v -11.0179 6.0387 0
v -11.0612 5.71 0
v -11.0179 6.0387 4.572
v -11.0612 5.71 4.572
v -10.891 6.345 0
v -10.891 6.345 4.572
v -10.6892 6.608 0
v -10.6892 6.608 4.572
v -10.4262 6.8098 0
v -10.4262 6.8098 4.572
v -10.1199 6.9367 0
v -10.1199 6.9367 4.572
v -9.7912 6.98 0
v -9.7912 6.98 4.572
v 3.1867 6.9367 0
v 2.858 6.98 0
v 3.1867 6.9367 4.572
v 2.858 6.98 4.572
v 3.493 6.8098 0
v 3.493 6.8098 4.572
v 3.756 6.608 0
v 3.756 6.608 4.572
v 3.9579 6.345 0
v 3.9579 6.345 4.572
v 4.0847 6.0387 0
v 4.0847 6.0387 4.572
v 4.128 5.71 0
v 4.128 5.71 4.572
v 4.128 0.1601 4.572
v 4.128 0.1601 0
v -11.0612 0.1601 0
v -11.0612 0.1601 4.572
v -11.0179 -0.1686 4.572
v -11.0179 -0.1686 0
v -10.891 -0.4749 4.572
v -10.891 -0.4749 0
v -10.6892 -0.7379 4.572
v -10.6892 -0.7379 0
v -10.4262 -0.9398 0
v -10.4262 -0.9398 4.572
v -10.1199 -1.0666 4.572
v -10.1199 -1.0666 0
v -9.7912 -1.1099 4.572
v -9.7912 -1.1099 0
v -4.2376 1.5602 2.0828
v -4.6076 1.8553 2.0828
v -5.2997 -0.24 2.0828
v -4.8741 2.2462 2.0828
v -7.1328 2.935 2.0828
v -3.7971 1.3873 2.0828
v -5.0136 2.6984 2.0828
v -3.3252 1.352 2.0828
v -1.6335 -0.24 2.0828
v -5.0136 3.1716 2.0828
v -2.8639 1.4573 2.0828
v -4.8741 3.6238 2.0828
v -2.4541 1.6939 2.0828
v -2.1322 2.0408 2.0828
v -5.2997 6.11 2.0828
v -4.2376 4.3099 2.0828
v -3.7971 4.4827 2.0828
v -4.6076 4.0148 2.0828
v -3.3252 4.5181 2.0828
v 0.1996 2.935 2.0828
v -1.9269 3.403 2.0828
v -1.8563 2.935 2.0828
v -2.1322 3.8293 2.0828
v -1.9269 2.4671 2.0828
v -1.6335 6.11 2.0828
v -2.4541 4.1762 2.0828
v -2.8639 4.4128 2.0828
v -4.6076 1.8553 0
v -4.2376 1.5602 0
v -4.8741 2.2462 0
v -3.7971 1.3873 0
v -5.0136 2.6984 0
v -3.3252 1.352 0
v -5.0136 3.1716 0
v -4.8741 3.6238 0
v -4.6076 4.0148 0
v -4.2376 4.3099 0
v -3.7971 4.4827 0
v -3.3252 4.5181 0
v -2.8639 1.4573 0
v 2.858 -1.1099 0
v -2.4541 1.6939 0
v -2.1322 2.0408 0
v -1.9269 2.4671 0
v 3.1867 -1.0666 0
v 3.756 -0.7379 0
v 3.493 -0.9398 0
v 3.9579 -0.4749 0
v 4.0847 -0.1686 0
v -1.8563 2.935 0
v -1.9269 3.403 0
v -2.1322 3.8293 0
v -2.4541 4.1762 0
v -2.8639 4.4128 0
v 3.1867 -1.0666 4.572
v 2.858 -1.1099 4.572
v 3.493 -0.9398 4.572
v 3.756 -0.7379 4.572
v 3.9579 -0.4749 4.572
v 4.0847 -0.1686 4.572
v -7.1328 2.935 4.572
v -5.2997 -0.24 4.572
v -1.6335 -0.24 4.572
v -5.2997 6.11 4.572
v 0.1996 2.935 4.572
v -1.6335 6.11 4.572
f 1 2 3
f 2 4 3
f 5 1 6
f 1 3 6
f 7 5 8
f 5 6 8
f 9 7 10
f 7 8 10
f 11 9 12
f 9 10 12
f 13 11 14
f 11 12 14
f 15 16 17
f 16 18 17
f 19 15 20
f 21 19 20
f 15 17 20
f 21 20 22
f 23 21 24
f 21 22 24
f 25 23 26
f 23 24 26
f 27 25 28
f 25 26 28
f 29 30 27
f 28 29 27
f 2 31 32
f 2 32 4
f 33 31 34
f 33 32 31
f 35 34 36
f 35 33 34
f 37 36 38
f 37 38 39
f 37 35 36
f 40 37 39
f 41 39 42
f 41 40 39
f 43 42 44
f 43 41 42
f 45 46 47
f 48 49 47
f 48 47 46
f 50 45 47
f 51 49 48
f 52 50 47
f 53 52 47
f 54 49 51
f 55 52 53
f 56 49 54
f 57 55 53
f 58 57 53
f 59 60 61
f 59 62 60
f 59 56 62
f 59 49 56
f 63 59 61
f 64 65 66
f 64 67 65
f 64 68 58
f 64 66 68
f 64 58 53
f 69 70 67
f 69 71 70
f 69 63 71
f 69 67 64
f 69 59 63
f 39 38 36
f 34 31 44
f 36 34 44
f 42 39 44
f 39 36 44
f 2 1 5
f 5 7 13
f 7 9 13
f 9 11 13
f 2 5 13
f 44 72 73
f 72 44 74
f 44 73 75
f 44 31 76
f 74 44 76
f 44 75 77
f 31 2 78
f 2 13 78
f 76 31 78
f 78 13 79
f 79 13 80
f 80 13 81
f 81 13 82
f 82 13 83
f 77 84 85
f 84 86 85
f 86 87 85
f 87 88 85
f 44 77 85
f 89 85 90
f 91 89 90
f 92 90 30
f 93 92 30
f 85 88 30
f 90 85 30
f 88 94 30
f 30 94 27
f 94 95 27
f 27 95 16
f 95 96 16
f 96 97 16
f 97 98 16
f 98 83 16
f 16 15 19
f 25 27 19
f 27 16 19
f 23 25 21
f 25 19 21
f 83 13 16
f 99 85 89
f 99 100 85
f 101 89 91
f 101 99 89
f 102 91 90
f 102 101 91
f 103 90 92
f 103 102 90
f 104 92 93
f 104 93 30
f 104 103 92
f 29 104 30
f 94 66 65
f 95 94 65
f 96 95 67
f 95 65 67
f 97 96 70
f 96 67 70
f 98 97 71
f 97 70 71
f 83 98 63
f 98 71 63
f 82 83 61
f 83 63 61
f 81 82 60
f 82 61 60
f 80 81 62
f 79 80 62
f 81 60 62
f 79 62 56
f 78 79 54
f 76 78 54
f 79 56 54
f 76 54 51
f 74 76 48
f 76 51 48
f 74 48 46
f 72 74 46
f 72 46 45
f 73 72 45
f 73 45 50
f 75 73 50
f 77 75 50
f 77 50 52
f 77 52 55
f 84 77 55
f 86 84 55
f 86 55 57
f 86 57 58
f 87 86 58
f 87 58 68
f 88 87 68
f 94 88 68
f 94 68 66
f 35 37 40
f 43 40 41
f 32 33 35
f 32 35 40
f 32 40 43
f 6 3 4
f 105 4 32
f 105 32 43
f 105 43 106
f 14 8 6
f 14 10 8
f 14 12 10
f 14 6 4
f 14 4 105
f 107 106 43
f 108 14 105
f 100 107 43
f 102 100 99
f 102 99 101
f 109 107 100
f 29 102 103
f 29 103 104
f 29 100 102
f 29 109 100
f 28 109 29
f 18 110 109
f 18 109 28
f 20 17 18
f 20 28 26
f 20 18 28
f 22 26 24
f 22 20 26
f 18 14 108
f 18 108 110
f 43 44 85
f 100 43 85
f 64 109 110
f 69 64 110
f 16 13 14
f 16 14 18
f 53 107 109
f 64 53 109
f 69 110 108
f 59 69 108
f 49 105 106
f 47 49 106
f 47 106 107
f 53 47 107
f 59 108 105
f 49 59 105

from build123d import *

# Parameters (mm, degrees)
F0_W     = 15.1892
F0_H     = 8.0899
F1_DEPTH = 4.572
F3_DEPTH = 2.4892
F4_R     = 1.5875
F5_DEPTH = 25.4
F6_R     = 1.27


with BuildPart() as f1:
    # F0 (on Top) → F1 (new body)
    with BuildSketch(Plane.XY):
        with Locations((-3.466585, 2.935039)):
            Rectangle(F0_W, F0_H)
    extrude(amount=F1_DEPTH)

    # F2 (on face) → F3 (cut)
    with BuildSketch(Plane.XY.offset(4.572)):
        Polygon((-1.633498, -0.239961), (0.199589, 2.935039), (-1.633498, 6.110039), (-5.299672, 6.110039), (-7.132759, 2.935039), (-5.299672, -0.239961), align=None)
    extrude(amount=-F3_DEPTH, mode=Mode.SUBTRACT)

    # F4 (on face) → F5 (cut)
    with BuildSketch(Plane.XY.offset(2.0828)):
        with Locations((-3.443841, 2.935039)):
            Circle(F4_R)
    extrude(amount=-F5_DEPTH, mode=Mode.SUBTRACT)

    # F6
    f6_edges = [f1.edges().sort_by_distance(p)[0] for p in [
        (4.128015, -1.109911, 2.286),
        (-11.061185, -1.109911, 2.286),
        (-11.061185, 6.979989, 2.286),
        (4.128015, 6.979989, 2.286),
    ]]
    fillet(f6_edges, radius=F6_R)


solid = f1.part
